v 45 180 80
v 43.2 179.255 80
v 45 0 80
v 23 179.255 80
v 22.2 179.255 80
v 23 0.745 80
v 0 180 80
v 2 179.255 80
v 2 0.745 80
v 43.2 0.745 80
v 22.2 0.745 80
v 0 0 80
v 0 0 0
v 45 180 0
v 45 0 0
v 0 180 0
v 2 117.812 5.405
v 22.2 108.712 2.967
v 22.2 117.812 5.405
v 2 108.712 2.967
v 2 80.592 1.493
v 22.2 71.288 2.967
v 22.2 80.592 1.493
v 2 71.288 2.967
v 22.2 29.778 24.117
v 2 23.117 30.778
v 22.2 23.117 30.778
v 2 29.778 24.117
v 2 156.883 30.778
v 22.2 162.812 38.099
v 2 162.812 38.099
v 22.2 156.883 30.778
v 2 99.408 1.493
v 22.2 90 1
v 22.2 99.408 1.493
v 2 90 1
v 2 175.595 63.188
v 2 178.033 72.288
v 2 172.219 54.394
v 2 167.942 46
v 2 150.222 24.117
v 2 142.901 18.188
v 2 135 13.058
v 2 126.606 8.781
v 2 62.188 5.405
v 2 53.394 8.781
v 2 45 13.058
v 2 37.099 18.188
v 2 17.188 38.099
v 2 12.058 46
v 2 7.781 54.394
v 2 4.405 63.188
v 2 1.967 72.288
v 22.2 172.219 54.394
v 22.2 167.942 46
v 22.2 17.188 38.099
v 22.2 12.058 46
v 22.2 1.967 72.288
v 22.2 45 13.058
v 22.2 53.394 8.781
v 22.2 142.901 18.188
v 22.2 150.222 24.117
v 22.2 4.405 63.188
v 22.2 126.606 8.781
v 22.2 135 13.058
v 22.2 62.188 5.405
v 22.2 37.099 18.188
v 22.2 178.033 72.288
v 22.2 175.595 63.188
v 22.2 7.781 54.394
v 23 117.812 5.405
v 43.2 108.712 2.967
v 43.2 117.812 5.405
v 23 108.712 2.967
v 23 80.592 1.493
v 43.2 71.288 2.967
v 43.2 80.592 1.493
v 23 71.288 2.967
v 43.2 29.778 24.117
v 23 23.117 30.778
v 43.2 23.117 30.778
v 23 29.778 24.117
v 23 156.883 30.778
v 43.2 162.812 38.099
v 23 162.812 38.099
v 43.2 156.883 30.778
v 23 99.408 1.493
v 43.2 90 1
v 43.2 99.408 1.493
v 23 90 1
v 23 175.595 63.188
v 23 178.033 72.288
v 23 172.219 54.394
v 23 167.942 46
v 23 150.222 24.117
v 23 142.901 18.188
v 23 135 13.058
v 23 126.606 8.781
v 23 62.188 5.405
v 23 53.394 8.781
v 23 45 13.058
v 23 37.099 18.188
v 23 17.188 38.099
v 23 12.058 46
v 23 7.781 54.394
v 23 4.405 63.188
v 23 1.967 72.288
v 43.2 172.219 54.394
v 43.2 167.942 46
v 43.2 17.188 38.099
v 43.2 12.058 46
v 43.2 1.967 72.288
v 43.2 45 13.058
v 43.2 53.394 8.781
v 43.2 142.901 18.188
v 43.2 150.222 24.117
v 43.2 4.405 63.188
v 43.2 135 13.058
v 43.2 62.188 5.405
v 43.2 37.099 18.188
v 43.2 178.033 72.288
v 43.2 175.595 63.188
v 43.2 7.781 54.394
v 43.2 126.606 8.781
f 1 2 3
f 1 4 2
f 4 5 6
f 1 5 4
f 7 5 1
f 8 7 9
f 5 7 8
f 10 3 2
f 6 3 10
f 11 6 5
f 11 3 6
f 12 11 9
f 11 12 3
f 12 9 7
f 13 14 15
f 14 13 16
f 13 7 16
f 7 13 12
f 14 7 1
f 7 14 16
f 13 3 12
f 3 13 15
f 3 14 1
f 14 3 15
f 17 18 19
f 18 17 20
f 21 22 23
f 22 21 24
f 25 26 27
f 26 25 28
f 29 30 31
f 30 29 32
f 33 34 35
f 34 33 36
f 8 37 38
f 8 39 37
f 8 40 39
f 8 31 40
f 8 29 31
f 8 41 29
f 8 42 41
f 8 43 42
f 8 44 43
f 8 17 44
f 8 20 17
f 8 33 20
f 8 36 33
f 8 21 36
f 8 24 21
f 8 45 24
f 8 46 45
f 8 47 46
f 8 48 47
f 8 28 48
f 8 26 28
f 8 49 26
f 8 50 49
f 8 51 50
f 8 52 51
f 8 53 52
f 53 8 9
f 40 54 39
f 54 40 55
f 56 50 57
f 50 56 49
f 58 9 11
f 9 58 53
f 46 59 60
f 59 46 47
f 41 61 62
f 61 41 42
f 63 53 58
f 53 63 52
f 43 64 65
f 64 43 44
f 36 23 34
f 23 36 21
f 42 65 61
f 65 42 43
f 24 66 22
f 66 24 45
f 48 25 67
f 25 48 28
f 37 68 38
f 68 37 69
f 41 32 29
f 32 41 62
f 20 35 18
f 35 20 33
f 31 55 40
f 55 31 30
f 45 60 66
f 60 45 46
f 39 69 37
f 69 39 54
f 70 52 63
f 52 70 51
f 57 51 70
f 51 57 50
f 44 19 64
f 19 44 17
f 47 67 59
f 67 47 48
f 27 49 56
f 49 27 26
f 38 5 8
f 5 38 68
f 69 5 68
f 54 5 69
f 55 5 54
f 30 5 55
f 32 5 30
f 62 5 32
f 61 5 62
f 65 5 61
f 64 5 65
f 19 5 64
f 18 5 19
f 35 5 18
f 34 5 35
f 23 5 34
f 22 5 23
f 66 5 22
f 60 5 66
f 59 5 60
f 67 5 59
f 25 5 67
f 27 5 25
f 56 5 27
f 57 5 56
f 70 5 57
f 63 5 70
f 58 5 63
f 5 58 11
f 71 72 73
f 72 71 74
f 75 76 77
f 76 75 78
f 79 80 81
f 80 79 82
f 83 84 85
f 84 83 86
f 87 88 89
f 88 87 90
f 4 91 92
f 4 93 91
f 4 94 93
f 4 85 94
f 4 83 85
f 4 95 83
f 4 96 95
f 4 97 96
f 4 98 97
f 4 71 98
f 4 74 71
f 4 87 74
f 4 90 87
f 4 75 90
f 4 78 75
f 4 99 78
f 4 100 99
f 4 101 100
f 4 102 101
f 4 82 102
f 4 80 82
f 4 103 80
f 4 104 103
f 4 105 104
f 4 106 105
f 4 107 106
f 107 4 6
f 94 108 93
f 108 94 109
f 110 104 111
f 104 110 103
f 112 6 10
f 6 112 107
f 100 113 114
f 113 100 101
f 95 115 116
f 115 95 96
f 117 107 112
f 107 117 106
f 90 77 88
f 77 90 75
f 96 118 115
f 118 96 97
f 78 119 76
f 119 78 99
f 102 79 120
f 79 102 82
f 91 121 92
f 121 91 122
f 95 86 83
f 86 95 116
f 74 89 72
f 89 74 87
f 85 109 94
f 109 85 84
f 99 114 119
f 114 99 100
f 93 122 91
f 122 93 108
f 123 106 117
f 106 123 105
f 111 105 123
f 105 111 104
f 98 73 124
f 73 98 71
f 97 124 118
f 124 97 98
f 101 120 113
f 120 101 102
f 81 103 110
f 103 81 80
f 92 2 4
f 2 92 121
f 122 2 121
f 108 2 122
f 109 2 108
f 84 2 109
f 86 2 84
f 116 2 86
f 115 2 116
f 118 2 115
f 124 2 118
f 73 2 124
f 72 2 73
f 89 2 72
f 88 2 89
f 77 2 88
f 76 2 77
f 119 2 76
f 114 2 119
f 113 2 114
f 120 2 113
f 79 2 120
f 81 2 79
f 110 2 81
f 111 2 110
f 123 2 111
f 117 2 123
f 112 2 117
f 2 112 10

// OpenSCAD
// =============================================
// 3D: Horizontal Holder for 2 Bottles (75x180)
// Version: 1.0
// Author: ChatGPT (OpenSCAD)
// =============================================

// ----------------------------
description = "Horizontal holder for 2 bottles, d=180, len=75";

// Shared library
use <../modules.scad>

// ----------------------------
// Параметры модели
// ----------------------------
cap_diam      = 180;     // диаметр крышки, мм
cap_width     = 20;     // ширина крышки, мм
num_caps      = 2;       // количество крышек
wall_th       = 1;       // толщина стенок, мм
holder_length = 180;      // длина держателя по X, мм

// Габариты/толщины
rail_w        = 0;       // боковые рельсы убраны
rail_h        = 0;       // высота рельса по Z, мм (не используется)
base_th       = 0;       // толщина тонкой базы (не используется)
bridge_th     = 2;       // толщина облегчённых перемычек (мостов), мм
bridge_pitch  = 35;      // шаг перемычек по X, мм
end_stop_h    = 0;       // высота торцевых упоров, мм (не используется)
end_stop_th   = 1;       // толщина торцевых упоров по X, мм
max_h         = 80;      // ограничение по высоте всей детали, мм

// Скругление краёв через minkowski
use_minkowski = false;    // включить скругление краёв
minkowski_r   = 1;       // радиус сферы для скругления, мм

// ----------------------------
// Настройка точности
// ----------------------------
$fn = 0;        // фиксированную сегментацию отключаем
$fa = 6;        // 5–8° обычно достаточно
$fs = 0.35;     // ≈ диаметр сопла (0.3–0.5 для сопла 0.4)
pin_fs = 0.25;  // для цилиндров высокой точности

// ----------------------------
// Тестовые фрагменты
// ----------------------------
test_fragment = false;  // true — печатать только укороченные фрагменты
frag_size     = 20;     // размер окна вырезки по XY
frag_index    = 0;      // 0=НЛ, 1=ВЛ, 2=НП, 3=ВП (относительно основания)
frag_gap_x    = 10;     // зазор между фрагментами по X, мм
frag_h_extra  = 12;     // запас по высоте клипа, мм

// ----------------------------
// Общие доп. параметры
// ----------------------------
tiny = 0.1;  // небольшой зазор для булевых операций

// Вычисляемые размеры
cap_radius = cap_diam / 2;  // радиус крышки
// Высота ограничена max_h
holder_height = max_h;
// Длина по Y ограничена holder_length
tot_y = holder_length;
// Длина по X - должна вмещать 2 крышки + стенки
pad_between = 1;  // зазор между крышками по X, мм
tot_x = num_caps * cap_width + (num_caps - 1) * pad_between + 2 * wall_th + 2 * end_stop_th;

// Центры крышек по X
// Крышки расположены одна за другой вдоль X, по центру по Y и Z
function cap_center_x(i) = end_stop_th + wall_th + cap_width/2 + i * (cap_width + pad_between);

// ----------------------------
// Вспомогательные модули
// ----------------------------
// Цилиндрический вырез для крышки (вдоль оси X)
module cylinder_cutter(center_x){
    // Цилиндр проходит вдоль оси X, ограничен по длине cap_width, поднят на радиус по Z
    // Длина цилиндра = ширина крышки (для каждой крышки отдельный цилиндр)
    translate([center_x - cap_width/2, tot_y/2, holder_height/2 + cap_radius / 2 + wall_th * 6])
        rotate([0, 90, 0])
            cylinder(h = cap_width + 2*tiny, d = cap_diam, $fs=pin_fs, $fa=6);
}

// Торцевые упоры по X
module end_stop(){
    // у левого края
    translate([0, 0, 0]) cube([end_stop_th, tot_y, holder_height], center=false);
    // у правого края
    translate([tot_x - end_stop_th, 0, 0]) cube([end_stop_th, tot_y, holder_height], center=false);
}

// Объединение всех выемок
module cradle_cuts(){
    for(i = [0 : num_caps - 1]) {
        cylinder_cutter(cap_center_x(i));
    }
}

// Основной корпус
module deck_core(){
    cube([tot_x, tot_y, holder_height], center=false);
}

// Полная сборка
module base_raw(){
    intersection(){
        difference(){
            union(){
                deck_core();
                end_stop();
            }
            cradle_cuts();
        }
        // Срезаем верх по max_h
        translate([-tiny, -tiny, -tiny])
            cube([tot_x + 2*tiny, tot_y + 2*tiny, max_h + tiny], center=false);
    }
}

// Срезаем верх по z_cap на всякий случай
module base(){
    if (use_minkowski) {
        minkowski() {
            base_raw();
            sphere(r=minkowski_r, $fs=pin_fs, $fa=6);
        }
    } else {
        base_raw();
    }
}

// ----------------------------
// Клиппер фрагментов
// ----------------------------
module clip_for_fragments(){
    if(test_fragment){
        // Фрагмент у нижнего левого угла
        intersection(){
            children();
            translate([-tiny, -tiny, -frag_h_extra])
                cube([frag_size, frag_size, holder_height + 2*frag_h_extra], center=false);
        }
        // Фрагмент у верхнего правого угла
        translate([tot_x - frag_size - frag_gap_x, tot_y - frag_size - frag_gap_x, 0])
            intersection(){
                children();
                translate([-tiny, -tiny, -frag_h_extra])
                    cube([frag_size + tiny, frag_size + tiny, holder_height + 2*frag_h_extra], center=false);
            }
    }else{
        children();
    }
}

// Вывод модели
module flipped(){
    // Переворачиваем по Z так, чтобы низ был на Z=0
    translate([0,0,0]) mirror([0,0,0]) base();
}

clip_for_fragments() flipped();
